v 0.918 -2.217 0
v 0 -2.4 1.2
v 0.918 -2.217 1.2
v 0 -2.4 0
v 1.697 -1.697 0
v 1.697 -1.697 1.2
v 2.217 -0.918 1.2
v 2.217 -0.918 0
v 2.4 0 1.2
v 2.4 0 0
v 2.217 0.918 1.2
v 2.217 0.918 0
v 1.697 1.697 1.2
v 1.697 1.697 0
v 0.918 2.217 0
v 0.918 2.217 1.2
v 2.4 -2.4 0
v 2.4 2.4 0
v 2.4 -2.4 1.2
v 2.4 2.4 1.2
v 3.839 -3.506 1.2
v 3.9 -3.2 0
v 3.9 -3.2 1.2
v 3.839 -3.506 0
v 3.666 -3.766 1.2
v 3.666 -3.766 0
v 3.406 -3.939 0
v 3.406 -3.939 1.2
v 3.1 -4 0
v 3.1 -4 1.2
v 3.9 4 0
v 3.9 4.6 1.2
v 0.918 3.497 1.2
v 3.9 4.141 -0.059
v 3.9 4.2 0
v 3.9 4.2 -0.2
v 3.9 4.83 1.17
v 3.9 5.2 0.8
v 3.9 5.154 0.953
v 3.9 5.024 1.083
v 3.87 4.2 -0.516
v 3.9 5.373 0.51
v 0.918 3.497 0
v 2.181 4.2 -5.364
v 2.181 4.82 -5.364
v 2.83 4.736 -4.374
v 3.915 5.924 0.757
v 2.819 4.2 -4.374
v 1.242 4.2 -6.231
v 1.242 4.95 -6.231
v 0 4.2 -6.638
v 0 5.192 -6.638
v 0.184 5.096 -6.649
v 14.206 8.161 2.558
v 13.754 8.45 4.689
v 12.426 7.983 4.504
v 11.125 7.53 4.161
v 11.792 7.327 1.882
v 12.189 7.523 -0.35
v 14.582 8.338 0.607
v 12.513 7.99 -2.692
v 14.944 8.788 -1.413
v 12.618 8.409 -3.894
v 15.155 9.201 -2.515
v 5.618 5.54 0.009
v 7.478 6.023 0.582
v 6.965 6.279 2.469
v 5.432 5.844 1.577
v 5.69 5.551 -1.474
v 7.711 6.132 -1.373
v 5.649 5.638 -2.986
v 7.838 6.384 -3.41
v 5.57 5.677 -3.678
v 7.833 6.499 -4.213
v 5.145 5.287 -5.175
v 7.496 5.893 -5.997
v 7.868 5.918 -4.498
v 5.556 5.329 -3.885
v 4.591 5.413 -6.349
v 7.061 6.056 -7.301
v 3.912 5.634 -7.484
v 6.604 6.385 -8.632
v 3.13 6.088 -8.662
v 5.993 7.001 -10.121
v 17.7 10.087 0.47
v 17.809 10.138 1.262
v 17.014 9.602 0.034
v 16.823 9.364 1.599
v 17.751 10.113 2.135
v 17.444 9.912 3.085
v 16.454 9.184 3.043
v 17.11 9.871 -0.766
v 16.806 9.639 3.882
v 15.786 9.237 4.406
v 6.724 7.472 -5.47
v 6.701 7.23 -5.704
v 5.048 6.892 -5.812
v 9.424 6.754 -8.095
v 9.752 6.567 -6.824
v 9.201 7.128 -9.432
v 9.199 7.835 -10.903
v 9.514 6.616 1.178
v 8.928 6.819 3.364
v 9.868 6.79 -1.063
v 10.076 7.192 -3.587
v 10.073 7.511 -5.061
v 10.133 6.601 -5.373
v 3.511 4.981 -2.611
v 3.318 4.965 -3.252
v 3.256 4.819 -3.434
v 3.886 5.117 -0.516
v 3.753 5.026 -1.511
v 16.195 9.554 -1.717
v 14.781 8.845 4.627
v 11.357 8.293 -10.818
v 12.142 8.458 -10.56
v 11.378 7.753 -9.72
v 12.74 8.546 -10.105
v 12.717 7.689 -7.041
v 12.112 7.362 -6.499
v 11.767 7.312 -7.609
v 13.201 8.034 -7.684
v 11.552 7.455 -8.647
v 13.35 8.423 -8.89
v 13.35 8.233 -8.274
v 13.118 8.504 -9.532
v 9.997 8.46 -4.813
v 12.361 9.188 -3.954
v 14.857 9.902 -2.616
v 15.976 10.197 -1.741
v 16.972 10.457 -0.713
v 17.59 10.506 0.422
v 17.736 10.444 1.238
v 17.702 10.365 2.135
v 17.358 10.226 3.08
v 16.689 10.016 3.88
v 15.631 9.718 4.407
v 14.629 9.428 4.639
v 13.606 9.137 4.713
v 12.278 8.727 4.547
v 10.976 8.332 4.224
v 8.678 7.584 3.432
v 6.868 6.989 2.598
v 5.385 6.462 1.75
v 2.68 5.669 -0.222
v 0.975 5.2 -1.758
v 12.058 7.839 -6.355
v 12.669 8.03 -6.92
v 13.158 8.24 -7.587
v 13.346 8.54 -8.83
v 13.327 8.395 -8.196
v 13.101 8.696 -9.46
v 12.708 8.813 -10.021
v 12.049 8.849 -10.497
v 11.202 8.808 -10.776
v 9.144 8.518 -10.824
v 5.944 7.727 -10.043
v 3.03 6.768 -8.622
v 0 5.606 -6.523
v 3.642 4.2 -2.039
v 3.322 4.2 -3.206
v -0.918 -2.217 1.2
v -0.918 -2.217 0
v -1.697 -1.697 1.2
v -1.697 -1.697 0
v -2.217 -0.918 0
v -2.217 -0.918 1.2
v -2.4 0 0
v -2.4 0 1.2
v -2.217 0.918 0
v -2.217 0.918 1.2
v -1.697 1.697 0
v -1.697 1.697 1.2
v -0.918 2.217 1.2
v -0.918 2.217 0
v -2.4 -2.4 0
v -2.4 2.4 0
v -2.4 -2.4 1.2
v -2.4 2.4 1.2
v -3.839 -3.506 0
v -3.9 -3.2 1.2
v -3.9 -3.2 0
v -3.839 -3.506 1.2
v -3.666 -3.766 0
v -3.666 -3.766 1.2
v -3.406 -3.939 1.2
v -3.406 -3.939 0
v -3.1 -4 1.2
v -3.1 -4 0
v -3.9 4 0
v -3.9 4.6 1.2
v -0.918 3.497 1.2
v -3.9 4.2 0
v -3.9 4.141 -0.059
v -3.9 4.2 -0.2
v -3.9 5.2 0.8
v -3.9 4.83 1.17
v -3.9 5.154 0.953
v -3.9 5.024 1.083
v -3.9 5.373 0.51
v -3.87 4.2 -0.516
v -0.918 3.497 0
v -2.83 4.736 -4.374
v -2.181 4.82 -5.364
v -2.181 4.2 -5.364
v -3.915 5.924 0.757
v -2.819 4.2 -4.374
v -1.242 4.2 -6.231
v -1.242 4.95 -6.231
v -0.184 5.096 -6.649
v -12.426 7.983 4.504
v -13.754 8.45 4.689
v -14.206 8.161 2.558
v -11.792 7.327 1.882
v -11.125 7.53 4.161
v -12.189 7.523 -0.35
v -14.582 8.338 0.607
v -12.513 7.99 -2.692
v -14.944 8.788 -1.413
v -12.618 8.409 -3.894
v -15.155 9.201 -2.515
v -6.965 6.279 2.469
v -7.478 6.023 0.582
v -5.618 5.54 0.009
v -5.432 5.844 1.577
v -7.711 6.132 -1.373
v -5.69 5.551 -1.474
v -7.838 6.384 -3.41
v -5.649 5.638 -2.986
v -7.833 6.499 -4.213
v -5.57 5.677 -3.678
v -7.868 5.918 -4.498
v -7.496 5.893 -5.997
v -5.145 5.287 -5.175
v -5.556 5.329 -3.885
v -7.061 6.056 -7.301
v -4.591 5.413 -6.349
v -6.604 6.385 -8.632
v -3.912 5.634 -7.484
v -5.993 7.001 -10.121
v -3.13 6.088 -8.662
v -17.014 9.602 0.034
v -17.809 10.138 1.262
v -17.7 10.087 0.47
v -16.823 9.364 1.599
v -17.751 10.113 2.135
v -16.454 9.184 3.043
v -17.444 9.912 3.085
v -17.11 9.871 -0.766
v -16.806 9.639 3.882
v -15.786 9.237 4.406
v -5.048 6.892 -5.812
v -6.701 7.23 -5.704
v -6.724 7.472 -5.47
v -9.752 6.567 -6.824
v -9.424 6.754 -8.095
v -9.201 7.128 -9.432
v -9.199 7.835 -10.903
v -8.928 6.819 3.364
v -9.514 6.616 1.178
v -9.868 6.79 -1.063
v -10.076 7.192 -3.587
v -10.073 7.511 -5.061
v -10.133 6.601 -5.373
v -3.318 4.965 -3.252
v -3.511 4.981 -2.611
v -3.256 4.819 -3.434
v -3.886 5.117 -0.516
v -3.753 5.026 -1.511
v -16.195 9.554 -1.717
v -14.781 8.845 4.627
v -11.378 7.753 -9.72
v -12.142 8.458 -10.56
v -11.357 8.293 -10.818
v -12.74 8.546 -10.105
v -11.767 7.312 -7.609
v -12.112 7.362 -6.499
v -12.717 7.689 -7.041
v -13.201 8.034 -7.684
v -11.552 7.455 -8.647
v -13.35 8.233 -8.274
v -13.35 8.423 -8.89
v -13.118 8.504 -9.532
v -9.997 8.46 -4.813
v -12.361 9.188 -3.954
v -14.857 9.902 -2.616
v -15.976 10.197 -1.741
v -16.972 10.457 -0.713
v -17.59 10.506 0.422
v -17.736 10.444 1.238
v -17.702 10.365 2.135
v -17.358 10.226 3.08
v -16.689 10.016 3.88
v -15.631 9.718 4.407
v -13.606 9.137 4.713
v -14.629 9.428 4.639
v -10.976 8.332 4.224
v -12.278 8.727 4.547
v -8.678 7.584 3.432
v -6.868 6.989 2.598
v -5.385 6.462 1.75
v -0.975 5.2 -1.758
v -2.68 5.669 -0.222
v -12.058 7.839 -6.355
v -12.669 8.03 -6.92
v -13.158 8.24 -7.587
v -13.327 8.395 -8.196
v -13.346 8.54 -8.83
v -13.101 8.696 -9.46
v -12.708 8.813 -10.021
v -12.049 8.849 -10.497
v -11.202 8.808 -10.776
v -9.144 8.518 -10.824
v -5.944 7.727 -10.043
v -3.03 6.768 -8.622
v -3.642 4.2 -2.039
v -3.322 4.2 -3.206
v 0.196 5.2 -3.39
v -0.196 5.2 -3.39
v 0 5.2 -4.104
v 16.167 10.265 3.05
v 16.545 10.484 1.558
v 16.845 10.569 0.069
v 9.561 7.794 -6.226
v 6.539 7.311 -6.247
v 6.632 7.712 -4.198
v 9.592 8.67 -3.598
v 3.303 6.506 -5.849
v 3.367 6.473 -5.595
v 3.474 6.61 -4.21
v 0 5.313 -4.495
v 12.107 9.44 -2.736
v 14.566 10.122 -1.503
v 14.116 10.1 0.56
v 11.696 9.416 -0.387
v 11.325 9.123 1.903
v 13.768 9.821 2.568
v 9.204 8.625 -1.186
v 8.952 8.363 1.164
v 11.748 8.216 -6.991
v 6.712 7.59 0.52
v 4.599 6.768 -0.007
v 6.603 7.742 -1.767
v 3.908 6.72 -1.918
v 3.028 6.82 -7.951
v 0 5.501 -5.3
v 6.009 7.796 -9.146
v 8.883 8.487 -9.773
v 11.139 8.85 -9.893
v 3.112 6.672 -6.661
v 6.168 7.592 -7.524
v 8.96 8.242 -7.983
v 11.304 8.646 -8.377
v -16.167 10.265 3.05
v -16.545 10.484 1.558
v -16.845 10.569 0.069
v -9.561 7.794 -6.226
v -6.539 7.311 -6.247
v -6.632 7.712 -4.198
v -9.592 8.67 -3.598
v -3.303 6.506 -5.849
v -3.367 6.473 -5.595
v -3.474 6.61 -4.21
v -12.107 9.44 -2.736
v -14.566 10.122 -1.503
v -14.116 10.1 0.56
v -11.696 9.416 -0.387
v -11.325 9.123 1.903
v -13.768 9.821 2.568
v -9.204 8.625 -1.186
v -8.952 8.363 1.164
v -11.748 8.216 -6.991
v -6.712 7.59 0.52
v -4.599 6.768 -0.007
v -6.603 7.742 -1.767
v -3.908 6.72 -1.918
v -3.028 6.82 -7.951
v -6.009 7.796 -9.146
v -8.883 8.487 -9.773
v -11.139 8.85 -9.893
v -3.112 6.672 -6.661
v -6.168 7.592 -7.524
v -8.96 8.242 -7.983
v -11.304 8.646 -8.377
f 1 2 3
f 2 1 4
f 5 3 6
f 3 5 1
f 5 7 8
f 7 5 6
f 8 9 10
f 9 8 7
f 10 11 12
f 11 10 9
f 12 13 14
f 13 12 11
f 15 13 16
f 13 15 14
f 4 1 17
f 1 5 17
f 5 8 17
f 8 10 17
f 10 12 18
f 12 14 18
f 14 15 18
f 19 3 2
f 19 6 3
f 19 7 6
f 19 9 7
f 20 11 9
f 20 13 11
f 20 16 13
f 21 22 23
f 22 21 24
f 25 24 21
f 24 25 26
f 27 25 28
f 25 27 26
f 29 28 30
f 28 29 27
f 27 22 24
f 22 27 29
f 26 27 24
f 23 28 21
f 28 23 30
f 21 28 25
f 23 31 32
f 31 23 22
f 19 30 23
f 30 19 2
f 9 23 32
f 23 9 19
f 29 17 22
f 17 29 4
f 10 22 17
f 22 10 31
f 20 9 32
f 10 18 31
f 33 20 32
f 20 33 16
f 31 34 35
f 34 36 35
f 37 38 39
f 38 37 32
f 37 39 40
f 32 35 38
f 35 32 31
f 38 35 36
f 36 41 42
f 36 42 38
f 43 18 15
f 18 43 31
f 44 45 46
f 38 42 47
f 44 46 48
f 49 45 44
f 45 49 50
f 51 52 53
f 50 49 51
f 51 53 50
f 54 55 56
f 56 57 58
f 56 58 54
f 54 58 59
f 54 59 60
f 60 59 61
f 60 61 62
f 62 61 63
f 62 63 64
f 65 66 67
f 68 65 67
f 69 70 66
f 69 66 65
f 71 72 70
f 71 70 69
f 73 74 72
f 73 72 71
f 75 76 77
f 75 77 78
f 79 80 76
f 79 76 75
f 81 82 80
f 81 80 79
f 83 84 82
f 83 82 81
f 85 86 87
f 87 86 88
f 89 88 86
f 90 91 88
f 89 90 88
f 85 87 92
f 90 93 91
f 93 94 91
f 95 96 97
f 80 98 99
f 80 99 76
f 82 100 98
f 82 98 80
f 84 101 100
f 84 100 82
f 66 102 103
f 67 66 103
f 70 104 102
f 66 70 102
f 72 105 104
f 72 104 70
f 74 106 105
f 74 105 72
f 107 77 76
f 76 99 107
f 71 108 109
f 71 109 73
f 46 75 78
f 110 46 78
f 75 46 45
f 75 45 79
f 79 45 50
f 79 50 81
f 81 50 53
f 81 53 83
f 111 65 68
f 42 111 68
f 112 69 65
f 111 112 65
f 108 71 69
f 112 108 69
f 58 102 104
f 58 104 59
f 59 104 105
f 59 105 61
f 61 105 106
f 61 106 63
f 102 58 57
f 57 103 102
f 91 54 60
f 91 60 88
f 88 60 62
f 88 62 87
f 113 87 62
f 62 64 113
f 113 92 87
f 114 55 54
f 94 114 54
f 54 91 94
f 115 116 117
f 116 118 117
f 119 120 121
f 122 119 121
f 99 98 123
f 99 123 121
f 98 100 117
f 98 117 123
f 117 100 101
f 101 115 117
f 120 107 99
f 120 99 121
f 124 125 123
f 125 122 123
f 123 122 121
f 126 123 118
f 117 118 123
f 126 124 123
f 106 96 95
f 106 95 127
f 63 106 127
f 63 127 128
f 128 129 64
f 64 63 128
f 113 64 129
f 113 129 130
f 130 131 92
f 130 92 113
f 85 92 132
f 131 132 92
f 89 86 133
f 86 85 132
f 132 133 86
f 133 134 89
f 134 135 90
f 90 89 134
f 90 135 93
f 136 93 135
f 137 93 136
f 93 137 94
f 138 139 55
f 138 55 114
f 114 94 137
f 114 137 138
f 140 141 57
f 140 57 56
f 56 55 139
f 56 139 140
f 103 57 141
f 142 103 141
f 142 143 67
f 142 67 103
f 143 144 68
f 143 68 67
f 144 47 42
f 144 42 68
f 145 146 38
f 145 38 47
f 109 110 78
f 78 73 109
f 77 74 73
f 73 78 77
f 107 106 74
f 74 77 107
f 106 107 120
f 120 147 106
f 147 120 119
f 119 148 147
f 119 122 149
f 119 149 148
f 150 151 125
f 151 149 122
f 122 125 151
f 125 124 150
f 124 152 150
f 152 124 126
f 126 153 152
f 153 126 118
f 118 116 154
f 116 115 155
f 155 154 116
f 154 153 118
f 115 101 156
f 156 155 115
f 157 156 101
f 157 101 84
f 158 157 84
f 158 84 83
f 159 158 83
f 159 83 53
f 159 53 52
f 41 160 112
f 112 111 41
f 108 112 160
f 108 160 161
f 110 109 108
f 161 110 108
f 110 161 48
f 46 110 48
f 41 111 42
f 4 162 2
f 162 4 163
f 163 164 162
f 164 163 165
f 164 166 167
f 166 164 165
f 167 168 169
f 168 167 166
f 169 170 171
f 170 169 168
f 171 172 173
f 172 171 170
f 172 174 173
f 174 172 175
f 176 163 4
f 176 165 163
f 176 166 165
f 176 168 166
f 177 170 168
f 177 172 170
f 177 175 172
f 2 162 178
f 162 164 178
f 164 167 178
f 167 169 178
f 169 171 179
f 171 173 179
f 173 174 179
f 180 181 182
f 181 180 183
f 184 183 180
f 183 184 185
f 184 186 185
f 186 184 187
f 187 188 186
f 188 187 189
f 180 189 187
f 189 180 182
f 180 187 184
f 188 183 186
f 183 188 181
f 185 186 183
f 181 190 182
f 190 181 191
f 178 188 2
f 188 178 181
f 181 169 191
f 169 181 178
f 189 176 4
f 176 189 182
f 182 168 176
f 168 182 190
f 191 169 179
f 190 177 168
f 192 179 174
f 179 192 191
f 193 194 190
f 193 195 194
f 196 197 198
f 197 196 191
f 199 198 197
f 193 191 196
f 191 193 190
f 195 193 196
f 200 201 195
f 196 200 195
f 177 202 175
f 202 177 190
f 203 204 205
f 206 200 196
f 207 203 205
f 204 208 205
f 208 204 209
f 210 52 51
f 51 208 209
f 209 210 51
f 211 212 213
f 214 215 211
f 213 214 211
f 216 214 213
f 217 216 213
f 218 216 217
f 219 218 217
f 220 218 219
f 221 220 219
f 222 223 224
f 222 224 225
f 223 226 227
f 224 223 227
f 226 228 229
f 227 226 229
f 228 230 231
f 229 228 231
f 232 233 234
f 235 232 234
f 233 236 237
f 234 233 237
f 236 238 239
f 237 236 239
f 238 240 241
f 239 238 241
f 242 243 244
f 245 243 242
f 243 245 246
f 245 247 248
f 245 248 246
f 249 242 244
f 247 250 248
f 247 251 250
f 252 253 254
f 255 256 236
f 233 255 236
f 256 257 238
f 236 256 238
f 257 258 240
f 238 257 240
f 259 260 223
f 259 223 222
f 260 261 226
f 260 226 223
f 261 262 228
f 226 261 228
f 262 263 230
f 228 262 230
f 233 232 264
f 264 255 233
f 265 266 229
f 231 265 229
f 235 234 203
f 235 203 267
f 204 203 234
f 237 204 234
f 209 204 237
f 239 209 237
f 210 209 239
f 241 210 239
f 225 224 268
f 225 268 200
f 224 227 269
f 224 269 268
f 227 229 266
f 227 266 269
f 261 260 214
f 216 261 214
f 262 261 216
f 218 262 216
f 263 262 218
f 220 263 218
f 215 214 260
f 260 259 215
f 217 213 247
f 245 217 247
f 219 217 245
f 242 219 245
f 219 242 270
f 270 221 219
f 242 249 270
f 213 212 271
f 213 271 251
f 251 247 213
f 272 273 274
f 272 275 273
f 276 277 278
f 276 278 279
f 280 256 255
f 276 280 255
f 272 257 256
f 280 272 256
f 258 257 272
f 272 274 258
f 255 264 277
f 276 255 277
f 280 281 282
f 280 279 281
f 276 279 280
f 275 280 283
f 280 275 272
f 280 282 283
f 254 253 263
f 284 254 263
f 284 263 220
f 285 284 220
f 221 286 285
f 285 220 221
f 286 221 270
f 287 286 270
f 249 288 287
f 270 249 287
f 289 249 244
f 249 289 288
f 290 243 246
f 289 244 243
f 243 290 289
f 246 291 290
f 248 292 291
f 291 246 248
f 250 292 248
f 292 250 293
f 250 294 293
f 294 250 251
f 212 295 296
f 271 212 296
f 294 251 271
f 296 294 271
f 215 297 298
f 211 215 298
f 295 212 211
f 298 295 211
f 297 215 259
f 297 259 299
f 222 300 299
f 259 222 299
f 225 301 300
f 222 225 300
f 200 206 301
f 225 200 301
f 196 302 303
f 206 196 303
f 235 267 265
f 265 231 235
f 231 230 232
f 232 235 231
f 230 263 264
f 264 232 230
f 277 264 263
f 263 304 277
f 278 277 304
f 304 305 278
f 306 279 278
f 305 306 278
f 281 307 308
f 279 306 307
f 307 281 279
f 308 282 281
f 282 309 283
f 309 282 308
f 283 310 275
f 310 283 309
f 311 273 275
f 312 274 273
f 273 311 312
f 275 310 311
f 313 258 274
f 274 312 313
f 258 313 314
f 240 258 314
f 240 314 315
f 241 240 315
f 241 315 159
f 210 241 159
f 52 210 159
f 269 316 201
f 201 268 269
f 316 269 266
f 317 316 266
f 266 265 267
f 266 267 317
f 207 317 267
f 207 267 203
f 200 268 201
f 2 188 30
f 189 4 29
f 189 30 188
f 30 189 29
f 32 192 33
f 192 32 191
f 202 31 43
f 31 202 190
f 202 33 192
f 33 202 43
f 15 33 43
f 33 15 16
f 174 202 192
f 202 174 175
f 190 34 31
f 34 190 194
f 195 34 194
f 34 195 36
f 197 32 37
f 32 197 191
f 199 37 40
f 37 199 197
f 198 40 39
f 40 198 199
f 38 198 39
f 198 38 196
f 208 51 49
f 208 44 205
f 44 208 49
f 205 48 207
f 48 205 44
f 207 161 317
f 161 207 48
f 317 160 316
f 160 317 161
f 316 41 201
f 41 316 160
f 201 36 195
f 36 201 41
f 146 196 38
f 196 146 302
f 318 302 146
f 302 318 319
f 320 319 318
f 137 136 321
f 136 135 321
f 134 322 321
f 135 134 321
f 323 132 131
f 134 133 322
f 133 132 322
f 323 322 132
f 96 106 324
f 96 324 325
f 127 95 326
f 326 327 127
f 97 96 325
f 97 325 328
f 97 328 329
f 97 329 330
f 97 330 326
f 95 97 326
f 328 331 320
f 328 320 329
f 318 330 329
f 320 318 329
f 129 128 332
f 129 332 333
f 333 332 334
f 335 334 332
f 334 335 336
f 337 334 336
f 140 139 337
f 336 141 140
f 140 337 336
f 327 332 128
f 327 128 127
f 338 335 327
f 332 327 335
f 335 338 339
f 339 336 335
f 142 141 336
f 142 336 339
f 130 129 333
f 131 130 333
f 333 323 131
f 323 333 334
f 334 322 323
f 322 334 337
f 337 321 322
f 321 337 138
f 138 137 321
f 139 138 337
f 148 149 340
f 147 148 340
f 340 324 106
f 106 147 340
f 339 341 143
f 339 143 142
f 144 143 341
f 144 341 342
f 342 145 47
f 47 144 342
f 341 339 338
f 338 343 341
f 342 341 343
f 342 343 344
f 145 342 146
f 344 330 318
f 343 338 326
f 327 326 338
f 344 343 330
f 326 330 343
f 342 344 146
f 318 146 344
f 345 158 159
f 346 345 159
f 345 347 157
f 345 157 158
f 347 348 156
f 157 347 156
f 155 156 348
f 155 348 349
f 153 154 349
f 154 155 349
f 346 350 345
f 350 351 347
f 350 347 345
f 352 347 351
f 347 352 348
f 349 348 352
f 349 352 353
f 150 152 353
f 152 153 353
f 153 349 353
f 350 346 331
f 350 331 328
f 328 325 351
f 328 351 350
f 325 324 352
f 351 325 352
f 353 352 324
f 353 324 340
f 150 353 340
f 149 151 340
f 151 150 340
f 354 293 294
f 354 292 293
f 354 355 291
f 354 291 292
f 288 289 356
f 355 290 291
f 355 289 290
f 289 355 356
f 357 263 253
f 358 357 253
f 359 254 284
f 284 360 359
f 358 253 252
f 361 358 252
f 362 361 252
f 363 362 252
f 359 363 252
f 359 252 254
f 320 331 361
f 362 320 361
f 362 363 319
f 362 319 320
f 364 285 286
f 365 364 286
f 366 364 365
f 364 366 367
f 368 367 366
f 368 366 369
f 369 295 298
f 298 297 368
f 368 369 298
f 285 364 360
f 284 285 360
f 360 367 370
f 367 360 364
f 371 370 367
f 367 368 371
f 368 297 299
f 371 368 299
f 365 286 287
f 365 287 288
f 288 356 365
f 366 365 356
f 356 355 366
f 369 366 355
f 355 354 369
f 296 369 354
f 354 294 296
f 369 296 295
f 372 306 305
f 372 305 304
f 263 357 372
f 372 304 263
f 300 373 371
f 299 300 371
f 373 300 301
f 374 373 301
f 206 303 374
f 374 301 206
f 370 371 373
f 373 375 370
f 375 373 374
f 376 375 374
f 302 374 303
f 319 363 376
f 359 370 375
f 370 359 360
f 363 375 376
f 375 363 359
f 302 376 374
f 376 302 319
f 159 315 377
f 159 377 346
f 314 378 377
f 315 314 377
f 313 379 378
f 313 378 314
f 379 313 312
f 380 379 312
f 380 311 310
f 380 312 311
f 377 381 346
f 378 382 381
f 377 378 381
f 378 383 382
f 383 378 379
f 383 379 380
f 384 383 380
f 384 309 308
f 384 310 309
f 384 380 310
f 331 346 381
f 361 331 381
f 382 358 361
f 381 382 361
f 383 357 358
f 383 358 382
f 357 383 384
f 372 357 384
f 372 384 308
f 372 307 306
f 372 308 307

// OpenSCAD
use <../lib.scad>
use <s/10183s01.scad>
use <s/10183s03.scad>
function ldraw_lib__10183() = [
// 0 Minifig Wings Fairy
// 0 Name: 10183.dat
// 0 Author: Gerald Lasser [GeraldLasser]
// 0 !LDRAW_ORG Part UPDATE 2023-03
// 0 !LICENSE Licensed under CC BY 4.0 : see CAreadme.txt
// 
// 0 BFC CERTIFY CCW
  [0,"BFC","CERTIFY"],
  [0,"BFC","CCW"],
// 
// 0 !CATEGORY Minifig Neckwear
// 0 !KEYWORDS Bee, Fly, Killer Moth, The Wasp
// 
// 0 !HISTORY 2013-08-14 {LEGO Digital Designer} Original part shape
// 0 !HISTORY 2021-04-29 [GeraldLasser] File preparation for LDraw Parts Tracker
// 0 !HISTORY 2023-06-24 [OrionP] Official Update 2023-03
// 
// 
// 1 16 0 0 0 1 0 0 0 1 0 0 0 1 s\10183s01.dat
  [1,16,0,0,0,1,0,0,0,1,0,0,0,1, ldraw_lib__s__10183s01()],
// 
// 1 16 0 0 0 1 0 0 0 1 0 0 0 1 s\10183s03.dat
  [1,16,0,0,0,1,0,0,0,1,0,0,0,1, ldraw_lib__s__10183s03()],
// 1 16 0 0 0 -1 0 0 0 1 0 0 0 1 s\10183s03.dat
  [1,16,0,0,0,-1,0,0,0,1,0,0,0,1, ldraw_lib__s__10183s03()],
];
module ldraw_lib__10183(step=0, col=false, unit=2/5, alt=false, line=0.2, solid=!$preview)
    makepoly(ldraw_lib__10183(), step=step, col=col, unit=unit, alt=alt, line=line, solid=solid);
ldraw_lib__10183(line=0.2);
